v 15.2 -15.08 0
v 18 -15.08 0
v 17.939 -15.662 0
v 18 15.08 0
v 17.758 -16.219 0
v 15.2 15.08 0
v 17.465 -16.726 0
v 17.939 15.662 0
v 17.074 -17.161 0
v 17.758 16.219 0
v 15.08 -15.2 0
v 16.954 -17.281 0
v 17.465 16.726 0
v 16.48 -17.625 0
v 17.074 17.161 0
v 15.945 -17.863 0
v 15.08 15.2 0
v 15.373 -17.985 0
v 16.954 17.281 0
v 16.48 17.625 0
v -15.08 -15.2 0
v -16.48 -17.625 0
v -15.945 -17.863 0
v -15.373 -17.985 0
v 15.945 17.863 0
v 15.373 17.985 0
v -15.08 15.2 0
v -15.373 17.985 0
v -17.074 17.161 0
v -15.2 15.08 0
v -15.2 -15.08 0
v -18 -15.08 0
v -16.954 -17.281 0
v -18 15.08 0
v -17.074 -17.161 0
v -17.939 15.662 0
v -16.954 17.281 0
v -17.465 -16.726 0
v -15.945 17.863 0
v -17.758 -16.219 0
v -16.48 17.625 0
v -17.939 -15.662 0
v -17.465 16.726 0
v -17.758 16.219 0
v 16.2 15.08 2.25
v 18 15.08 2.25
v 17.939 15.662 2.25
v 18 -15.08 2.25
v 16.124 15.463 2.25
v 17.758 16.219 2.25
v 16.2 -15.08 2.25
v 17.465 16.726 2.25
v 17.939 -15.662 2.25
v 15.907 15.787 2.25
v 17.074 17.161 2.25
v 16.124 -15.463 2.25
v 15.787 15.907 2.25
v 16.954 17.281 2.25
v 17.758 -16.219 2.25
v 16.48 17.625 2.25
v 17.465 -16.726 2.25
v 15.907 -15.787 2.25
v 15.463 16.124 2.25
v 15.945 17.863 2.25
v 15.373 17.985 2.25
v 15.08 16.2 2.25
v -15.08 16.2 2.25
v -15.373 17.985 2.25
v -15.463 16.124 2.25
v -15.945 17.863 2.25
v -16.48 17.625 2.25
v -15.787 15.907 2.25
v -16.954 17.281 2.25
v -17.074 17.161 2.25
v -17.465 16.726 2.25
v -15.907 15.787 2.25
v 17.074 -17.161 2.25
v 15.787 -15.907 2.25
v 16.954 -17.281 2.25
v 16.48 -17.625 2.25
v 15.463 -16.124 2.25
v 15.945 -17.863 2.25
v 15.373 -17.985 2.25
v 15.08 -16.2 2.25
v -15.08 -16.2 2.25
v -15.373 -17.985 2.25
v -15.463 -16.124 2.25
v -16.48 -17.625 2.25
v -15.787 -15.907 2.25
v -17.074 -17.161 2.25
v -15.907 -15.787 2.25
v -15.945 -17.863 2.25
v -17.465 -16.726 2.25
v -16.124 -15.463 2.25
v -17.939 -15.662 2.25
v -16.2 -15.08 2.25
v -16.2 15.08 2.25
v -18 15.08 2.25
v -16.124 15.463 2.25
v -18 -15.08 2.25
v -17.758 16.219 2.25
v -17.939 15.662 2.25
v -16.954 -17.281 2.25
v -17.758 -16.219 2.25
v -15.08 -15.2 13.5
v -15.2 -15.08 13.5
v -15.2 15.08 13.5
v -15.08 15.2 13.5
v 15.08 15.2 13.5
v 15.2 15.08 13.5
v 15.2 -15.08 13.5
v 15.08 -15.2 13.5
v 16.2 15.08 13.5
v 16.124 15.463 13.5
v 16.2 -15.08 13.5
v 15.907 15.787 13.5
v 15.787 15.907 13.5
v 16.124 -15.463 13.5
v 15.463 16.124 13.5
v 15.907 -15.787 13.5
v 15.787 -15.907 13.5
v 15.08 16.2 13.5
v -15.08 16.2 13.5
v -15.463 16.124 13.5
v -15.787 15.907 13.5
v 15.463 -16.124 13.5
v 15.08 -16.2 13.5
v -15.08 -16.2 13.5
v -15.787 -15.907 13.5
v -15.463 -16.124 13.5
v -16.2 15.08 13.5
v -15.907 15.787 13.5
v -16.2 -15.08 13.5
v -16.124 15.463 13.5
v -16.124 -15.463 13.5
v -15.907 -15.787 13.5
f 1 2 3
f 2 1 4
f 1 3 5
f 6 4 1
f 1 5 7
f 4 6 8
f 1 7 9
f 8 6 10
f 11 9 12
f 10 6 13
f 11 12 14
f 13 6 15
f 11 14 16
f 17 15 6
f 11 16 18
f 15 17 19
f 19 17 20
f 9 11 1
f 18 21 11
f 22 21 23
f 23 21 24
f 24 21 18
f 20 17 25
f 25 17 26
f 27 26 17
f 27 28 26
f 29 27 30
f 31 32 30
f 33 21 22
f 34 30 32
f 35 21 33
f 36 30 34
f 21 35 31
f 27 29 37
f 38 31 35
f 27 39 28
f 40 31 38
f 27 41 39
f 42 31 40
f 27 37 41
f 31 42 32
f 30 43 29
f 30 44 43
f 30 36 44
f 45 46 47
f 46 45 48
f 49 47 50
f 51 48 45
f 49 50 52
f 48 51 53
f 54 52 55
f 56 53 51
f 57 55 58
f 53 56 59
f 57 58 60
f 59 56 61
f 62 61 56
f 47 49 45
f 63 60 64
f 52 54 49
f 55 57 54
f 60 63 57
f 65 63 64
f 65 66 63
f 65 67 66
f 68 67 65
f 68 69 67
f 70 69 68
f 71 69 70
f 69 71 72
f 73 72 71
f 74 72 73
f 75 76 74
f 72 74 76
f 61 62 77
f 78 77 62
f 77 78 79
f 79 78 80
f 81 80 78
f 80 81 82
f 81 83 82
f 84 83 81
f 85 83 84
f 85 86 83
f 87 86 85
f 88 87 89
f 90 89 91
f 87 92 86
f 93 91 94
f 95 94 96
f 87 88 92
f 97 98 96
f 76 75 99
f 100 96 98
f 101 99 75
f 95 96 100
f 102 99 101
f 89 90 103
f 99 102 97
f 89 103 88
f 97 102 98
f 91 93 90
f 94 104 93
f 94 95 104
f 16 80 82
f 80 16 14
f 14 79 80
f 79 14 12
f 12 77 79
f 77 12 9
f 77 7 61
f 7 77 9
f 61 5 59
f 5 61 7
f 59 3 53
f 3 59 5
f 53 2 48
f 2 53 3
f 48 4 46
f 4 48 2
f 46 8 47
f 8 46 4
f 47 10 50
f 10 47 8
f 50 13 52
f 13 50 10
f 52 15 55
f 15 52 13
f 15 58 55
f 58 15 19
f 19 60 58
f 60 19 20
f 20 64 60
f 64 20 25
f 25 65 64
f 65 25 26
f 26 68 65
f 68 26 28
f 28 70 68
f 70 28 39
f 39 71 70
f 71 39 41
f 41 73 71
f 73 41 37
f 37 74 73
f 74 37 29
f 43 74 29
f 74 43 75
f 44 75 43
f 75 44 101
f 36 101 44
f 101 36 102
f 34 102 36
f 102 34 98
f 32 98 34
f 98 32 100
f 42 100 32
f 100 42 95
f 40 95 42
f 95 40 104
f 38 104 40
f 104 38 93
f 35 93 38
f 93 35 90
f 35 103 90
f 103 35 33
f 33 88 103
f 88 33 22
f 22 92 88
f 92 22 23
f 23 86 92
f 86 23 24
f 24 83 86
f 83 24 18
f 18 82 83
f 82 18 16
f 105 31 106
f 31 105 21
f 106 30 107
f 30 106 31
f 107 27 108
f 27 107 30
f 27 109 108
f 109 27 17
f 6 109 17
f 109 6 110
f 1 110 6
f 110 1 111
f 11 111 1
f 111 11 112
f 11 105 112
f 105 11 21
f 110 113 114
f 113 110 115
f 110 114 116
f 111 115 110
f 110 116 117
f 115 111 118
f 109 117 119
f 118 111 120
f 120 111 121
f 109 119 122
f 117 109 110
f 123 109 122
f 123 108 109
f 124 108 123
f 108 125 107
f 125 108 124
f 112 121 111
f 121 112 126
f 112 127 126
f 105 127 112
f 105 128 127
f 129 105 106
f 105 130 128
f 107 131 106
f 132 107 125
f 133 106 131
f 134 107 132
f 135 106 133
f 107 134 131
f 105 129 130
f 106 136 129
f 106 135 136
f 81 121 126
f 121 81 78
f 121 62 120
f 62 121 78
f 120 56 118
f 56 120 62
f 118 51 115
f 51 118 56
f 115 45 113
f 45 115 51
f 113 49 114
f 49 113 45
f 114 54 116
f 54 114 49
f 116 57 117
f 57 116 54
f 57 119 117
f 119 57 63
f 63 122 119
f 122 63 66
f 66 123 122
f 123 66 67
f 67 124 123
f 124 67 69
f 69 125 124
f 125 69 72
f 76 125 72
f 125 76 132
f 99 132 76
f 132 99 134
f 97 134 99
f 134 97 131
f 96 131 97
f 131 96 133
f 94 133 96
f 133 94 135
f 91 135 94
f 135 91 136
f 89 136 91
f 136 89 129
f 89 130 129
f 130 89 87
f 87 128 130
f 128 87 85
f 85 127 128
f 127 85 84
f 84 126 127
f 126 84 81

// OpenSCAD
// file: Common.scad
module offset_shell(thickness = 0.1) {
  render() {
      difference() {
          minkowski() {
            children();
            circle(2* thickness, center=true);
          }
        children();
      }
   }
}

module cookie_cutter(handle_thickness=8, cutter_tickness=3, total_height=15) {
    union() {
        linear_extrude(height = total_height*(0.15), slices = 60) {
            scale([.2,.2,1]) {
              offset_shell(handle_thickness) {
                children();

              }
            }
        };
        linear_extrude(height = total_height*(0.9), slices = 60)
            translate([0,0,2])
            scale([.2,.2,1]) {
              offset_shell(cutter_tickness) {
                children();
            }
        };
    }
}

module rod_with_clipped_circle(square_d, circle_d, circle_placement) {
    difference() {
        square(square_d, center=true);
        translate(circle_placement) circle(circle_d, center=true);
    }
}

//module cookie_press(handle_thickness=2.5, cutter_tickness=1, total_height=10) {
//    union() {
//        cookie_cutter(handle_thickness, cutter_tickness, total_height);
//        translate([0,0,10]) children();
//    }
//}
//
//
// file: ../ComplexShapes.scad
include <BasicShapes.scad>

module HalfCylinder(r, h, e=1, center=false) {
    translate([0,0, center ? -h/2 : 0])difference(){
        cylinder(h,r,r);
        translate([0,-r,-e])cube([2*r,2*r,h+2*e]);
    }
}

module HalfCircle(r) {
    difference(){
        circle(r);
        translate([-r,-2*r,0]) square(2*r);
    }
}

// http://benjamin-engel.blogspot.com/2015/07/openscad-tips-and-tricks.html

module equilateral_triangle(h) {
    rotate([0,0,-30]) circle(r=h, $fn=3);
}

module Crescent(r, fatten_scale=1, curve_angle=0, rotate=0) {
    r_prime = r / fatten_scale;
    rotate([0,0,rotate]) difference() {
        circle(r_prime*1.1);
        translate([r_prime/4, curve_angle*r_prime/4, 0]) circle(r_prime*fatten_scale);
    }
}


module round_edges(r) {
    minkowski() {
        children();
        circle(r);
    };
}

module CrescentV2(outer_r, inner_r, r_shift, edge_rounding=2) {
    // Different way to construct ... rounded edges ...
   round_edges(edge_rounding) {
        difference() {
            circle(outer_r);
            translate(r_shift) circle(inner_r);
        };
    };
}


//module Arch(x,y,r) {
//    // http://kitwallace.co.uk/Blog/item/2013-01-28T17:59:00Z
//    union() {
//        intersection() {
//           translate([x,y,0]) circle(r);
//           translate([-x,y,0]) circle(r);
//        }
//        translate([0,y/2,0]) square(size=[2 * (r-x), y], center=true);
//    }
//}

module Arch(width, arc_height, strech_height=0) {
    // http://kitwallace.co.uk/Blog/item/2013-01-28T17:59:00Z
    r = arc_height;
    x = (width / 2) - r;
    y = arc_height + strech_height;
    union() {
        intersection() {
           translate([x,y,0]) circle(r);
           translate([-x,y,0]) circle(r);
        }
        translate([0,y/2,0]) square(size=[width, y], center=true);
    }
}
// file: ../BasicShapes.scad
module Star(points, outer, inner_defaulted=0) {
    inner = inner_defaulted == 0 ? 2 * outer  : inner_defaulted;
	// polar to cartesian: radius/angle to x/y
	function x(r, a) = r * cos(a);
	function y(r, a) = r * sin(a);
	
	// angular width of each pie slice of the star
	increment = 360/points;
	
	union() {
		for (p = [0 : points-1]) {
			
			// outer is outer point p
			// inner is inner point following p
			// next is next outer point following p

			assign(	
                x_outer = x(outer, increment * p),
                y_outer = y(outer, increment * p),
                x_inner = x(inner, (increment * p) + (increment/2)),
                y_inner = y(inner, (increment * p) + (increment/2)),
                x_next  = x(outer, increment * (p+1)),
                y_next  = y(outer, increment * (p+1))
            ) {
				polygon(
                    points = [
                        [x_outer, y_outer], 
                        [x_inner, y_inner],
                        [x_next, y_next], 
                        [0, 0]
                    ], 
                    paths  = [[0, 1, 2, 3]]
                );
			}
		}
	}
}

//https://github.com/openscad/MCAD/blob/master/shapes.scad
module Hexagon(size) {
  Star(3, size, size);
}

module Octagon(size) {
  Star(4, size, size);
}

module Decagon(size) {
  Star(5, size, size);
}

module Decagon(size) {
  Star(5, size, size);
}

module Dodecagon(size) {
  Star(6, size, size);
}
// main file
include <../BasicShapes.scad>
include <../ComplexShapes.scad>
include <Common.scad>

// The Kaaba is an iconic cube. As a cookie cutter the faithful silhouette
// is a clean square with very slightly softened corners (so the print and
// the dough release cleanly). Earlier versions added wide, flat triangular
// "peaks" that made the outline read as a hexagon / house rather than a cube.

module kaabah(size) {
    corner = size * 0.06;          // subtle corner rounding
    side   = size * 8 * 1.9;       // overall edge length (kept close to old footprint)
    offset(r = corner) offset(r = -corner)
        square([side, side], center = true);
}

//kaabah(10);

cookie_cutter(7,2.5,15) {
    kaabah(10);
}
